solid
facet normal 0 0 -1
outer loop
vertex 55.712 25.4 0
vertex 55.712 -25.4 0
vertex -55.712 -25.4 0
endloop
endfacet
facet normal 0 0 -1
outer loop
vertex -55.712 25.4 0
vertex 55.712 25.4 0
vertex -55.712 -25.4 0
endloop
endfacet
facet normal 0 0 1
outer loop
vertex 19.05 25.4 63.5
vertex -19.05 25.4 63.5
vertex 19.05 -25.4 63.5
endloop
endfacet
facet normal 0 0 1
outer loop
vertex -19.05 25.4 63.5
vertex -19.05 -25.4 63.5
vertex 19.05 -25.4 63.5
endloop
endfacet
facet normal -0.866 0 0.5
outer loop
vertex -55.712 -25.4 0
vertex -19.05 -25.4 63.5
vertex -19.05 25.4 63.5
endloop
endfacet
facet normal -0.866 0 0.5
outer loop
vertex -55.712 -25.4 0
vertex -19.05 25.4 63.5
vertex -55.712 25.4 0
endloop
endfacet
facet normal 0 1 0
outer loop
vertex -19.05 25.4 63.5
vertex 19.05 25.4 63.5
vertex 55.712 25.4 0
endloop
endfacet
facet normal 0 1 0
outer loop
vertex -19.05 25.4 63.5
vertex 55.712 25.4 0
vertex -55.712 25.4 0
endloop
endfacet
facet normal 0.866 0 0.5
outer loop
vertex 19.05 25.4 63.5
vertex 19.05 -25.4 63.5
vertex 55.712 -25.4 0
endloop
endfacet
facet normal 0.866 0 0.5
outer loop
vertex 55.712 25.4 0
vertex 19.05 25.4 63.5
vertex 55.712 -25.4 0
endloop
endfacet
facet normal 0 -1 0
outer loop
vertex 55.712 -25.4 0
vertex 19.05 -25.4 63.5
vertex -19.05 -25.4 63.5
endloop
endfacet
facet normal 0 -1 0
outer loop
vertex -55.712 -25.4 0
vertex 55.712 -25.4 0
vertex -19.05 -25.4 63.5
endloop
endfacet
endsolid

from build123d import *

# Parameters (mm, degrees)
F0_W     = 38.1
F0_H     = 63.5
F1_DEPTH = 25.4
F3_DEPTH = 50.8


# Not quite as in the source:
# - a pattern or mirror of a feature is missing from the dataset's text; its kind, count and spacing are read off the source's solid


with BuildPart() as f1:
    # F0 (on Front) → F1 (new body, symmetric)
    with BuildSketch(Plane.XZ):
        with Locations((0, 31.75)):
            Rectangle(F0_W, F0_H)
    extrude(amount=F1_DEPTH, both=True)

    # F2 (on face) → F3 (join, through all)
    with BuildSketch(Plane.XZ.offset(25.4)):
        Polygon((-19.05, 0), (-19.05, 63.5), (-55.7117420935, 0), align=None)
    f3 = extrude(amount=-F3_DEPTH)

    # F3_copies: F3 across plane
    add(f3.mirror(Plane(origin=(0, 0, 0), x_dir=(0, 0, 1), z_dir=(1, 0, 0))))


solid = f1.part
